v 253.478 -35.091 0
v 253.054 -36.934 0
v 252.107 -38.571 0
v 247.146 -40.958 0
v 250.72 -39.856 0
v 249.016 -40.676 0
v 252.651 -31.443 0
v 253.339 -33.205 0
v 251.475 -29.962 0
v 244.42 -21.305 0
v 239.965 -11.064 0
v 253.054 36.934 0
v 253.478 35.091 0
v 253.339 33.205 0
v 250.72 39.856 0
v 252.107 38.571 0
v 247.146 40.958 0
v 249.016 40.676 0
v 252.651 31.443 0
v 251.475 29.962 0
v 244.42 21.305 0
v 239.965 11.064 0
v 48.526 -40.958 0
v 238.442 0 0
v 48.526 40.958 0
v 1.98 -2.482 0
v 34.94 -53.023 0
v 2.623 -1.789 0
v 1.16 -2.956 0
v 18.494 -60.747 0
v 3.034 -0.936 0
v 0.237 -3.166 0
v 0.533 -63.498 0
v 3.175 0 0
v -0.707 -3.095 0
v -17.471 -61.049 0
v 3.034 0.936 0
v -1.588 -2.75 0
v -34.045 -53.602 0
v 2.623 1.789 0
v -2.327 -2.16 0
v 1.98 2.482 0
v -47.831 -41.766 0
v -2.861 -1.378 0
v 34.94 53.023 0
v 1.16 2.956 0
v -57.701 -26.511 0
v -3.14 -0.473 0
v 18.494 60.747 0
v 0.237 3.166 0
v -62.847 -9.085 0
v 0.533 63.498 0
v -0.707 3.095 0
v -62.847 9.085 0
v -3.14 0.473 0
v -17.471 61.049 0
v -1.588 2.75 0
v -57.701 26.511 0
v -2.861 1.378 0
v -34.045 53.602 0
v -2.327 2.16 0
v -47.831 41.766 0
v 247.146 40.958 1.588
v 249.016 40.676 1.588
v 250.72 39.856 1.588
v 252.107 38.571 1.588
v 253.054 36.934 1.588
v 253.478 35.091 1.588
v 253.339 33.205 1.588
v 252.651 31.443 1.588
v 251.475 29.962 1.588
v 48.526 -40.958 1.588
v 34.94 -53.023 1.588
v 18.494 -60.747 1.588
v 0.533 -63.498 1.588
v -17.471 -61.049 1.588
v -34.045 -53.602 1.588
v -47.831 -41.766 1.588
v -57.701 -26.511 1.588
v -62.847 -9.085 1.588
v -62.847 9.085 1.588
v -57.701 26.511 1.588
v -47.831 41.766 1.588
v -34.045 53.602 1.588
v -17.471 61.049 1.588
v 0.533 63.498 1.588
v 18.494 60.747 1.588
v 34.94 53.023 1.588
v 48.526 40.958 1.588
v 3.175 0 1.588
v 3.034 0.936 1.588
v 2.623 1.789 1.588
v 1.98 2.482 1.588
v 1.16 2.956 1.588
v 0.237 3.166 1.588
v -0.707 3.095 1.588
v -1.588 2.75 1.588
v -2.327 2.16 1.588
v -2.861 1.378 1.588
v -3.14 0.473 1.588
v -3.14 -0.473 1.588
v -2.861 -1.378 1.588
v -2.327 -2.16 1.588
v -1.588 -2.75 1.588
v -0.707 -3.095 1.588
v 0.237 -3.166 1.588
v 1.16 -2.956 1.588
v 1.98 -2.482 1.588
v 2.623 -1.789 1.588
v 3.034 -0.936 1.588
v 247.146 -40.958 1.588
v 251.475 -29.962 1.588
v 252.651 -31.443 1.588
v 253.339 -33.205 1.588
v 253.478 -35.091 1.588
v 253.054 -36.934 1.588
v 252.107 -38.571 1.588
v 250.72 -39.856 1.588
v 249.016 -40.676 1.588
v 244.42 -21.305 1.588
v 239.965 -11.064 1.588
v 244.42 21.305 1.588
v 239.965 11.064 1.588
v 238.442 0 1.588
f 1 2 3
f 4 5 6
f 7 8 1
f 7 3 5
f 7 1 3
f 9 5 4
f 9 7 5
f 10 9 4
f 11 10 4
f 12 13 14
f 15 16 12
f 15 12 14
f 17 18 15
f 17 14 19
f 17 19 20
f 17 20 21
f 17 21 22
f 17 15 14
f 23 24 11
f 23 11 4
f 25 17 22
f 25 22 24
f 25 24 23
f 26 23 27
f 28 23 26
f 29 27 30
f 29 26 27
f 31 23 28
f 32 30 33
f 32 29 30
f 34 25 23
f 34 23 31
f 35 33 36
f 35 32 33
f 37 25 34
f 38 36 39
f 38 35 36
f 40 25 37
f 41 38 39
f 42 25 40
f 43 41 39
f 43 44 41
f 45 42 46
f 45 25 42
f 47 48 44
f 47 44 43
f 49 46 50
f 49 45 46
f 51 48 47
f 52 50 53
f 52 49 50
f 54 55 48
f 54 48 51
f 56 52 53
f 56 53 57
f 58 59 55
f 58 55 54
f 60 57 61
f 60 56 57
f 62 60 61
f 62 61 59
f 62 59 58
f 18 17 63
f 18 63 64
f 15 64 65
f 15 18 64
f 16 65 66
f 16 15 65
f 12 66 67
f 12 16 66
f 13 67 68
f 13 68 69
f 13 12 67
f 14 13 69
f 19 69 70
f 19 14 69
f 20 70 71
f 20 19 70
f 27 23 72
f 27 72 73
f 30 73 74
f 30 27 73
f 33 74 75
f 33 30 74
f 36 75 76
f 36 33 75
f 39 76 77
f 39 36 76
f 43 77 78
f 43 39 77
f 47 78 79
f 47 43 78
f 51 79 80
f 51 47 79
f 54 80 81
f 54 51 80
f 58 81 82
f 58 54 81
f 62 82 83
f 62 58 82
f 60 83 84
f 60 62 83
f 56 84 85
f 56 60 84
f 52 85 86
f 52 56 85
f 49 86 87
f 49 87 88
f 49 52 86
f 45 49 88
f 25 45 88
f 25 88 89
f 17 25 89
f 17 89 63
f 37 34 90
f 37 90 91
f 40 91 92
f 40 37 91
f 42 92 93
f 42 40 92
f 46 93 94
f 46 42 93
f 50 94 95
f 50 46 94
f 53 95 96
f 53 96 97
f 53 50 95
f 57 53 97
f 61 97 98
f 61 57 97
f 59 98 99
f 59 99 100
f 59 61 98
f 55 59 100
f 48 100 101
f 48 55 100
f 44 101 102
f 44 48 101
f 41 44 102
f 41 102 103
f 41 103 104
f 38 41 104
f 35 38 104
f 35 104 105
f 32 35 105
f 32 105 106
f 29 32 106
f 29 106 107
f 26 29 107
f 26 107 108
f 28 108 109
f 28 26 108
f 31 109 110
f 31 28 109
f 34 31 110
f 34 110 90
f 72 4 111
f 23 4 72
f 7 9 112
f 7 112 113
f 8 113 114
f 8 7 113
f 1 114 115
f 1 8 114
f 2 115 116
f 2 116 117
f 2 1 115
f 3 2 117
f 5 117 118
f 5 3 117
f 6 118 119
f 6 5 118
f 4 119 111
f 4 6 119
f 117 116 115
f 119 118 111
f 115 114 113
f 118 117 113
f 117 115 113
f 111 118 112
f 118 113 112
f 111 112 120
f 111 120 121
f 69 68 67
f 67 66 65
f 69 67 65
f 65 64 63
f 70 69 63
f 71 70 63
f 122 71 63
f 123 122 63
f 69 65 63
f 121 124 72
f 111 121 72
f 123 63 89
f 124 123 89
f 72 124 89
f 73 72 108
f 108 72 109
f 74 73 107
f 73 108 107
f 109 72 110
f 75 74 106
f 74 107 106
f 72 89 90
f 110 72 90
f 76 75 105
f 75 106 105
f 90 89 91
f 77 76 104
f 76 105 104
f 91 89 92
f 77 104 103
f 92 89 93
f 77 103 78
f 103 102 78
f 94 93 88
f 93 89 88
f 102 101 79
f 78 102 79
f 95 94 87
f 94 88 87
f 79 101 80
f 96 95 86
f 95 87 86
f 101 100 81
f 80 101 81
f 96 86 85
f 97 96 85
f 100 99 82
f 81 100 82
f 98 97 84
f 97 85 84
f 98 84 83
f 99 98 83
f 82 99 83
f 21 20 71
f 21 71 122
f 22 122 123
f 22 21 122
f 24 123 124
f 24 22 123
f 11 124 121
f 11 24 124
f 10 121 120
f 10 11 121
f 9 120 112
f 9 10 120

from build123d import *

# Parameters (mm, degrees)
SKETCH1_R           = 3.175
BOSS_EXTRUDE1_DEPTH = 1.5875


with BuildPart() as part:
    # Sketch1 → Boss-Extrude1 (new body)
    with BuildSketch(Plane.XY):
        with BuildLine():
            Line((247.146000248, -40.9575), (48.525593183, -40.9575))
            ThreePointArc((48.525593183, -40.9575), (-63.5, 0), (48.525593183, 40.9575))
            Line((48.525593183, 40.9575), (247.146000248, 40.9575))
            ThreePointArc((247.146000248, 40.9575), (253.054475846, 36.933959995), (251.475396188, 29.962197987))
            ThreePointArc((251.475396188, 29.962197987), (238.4425, 0), (251.475396188, -29.962197987))
            ThreePointArc((251.475396188, -29.962197987), (253.054475846, -36.933959995), (247.146000248, -40.9575))
        make_face()
        Circle(SKETCH1_R, mode=Mode.SUBTRACT)
    extrude(amount=BOSS_EXTRUDE1_DEPTH)


solid = part.part
